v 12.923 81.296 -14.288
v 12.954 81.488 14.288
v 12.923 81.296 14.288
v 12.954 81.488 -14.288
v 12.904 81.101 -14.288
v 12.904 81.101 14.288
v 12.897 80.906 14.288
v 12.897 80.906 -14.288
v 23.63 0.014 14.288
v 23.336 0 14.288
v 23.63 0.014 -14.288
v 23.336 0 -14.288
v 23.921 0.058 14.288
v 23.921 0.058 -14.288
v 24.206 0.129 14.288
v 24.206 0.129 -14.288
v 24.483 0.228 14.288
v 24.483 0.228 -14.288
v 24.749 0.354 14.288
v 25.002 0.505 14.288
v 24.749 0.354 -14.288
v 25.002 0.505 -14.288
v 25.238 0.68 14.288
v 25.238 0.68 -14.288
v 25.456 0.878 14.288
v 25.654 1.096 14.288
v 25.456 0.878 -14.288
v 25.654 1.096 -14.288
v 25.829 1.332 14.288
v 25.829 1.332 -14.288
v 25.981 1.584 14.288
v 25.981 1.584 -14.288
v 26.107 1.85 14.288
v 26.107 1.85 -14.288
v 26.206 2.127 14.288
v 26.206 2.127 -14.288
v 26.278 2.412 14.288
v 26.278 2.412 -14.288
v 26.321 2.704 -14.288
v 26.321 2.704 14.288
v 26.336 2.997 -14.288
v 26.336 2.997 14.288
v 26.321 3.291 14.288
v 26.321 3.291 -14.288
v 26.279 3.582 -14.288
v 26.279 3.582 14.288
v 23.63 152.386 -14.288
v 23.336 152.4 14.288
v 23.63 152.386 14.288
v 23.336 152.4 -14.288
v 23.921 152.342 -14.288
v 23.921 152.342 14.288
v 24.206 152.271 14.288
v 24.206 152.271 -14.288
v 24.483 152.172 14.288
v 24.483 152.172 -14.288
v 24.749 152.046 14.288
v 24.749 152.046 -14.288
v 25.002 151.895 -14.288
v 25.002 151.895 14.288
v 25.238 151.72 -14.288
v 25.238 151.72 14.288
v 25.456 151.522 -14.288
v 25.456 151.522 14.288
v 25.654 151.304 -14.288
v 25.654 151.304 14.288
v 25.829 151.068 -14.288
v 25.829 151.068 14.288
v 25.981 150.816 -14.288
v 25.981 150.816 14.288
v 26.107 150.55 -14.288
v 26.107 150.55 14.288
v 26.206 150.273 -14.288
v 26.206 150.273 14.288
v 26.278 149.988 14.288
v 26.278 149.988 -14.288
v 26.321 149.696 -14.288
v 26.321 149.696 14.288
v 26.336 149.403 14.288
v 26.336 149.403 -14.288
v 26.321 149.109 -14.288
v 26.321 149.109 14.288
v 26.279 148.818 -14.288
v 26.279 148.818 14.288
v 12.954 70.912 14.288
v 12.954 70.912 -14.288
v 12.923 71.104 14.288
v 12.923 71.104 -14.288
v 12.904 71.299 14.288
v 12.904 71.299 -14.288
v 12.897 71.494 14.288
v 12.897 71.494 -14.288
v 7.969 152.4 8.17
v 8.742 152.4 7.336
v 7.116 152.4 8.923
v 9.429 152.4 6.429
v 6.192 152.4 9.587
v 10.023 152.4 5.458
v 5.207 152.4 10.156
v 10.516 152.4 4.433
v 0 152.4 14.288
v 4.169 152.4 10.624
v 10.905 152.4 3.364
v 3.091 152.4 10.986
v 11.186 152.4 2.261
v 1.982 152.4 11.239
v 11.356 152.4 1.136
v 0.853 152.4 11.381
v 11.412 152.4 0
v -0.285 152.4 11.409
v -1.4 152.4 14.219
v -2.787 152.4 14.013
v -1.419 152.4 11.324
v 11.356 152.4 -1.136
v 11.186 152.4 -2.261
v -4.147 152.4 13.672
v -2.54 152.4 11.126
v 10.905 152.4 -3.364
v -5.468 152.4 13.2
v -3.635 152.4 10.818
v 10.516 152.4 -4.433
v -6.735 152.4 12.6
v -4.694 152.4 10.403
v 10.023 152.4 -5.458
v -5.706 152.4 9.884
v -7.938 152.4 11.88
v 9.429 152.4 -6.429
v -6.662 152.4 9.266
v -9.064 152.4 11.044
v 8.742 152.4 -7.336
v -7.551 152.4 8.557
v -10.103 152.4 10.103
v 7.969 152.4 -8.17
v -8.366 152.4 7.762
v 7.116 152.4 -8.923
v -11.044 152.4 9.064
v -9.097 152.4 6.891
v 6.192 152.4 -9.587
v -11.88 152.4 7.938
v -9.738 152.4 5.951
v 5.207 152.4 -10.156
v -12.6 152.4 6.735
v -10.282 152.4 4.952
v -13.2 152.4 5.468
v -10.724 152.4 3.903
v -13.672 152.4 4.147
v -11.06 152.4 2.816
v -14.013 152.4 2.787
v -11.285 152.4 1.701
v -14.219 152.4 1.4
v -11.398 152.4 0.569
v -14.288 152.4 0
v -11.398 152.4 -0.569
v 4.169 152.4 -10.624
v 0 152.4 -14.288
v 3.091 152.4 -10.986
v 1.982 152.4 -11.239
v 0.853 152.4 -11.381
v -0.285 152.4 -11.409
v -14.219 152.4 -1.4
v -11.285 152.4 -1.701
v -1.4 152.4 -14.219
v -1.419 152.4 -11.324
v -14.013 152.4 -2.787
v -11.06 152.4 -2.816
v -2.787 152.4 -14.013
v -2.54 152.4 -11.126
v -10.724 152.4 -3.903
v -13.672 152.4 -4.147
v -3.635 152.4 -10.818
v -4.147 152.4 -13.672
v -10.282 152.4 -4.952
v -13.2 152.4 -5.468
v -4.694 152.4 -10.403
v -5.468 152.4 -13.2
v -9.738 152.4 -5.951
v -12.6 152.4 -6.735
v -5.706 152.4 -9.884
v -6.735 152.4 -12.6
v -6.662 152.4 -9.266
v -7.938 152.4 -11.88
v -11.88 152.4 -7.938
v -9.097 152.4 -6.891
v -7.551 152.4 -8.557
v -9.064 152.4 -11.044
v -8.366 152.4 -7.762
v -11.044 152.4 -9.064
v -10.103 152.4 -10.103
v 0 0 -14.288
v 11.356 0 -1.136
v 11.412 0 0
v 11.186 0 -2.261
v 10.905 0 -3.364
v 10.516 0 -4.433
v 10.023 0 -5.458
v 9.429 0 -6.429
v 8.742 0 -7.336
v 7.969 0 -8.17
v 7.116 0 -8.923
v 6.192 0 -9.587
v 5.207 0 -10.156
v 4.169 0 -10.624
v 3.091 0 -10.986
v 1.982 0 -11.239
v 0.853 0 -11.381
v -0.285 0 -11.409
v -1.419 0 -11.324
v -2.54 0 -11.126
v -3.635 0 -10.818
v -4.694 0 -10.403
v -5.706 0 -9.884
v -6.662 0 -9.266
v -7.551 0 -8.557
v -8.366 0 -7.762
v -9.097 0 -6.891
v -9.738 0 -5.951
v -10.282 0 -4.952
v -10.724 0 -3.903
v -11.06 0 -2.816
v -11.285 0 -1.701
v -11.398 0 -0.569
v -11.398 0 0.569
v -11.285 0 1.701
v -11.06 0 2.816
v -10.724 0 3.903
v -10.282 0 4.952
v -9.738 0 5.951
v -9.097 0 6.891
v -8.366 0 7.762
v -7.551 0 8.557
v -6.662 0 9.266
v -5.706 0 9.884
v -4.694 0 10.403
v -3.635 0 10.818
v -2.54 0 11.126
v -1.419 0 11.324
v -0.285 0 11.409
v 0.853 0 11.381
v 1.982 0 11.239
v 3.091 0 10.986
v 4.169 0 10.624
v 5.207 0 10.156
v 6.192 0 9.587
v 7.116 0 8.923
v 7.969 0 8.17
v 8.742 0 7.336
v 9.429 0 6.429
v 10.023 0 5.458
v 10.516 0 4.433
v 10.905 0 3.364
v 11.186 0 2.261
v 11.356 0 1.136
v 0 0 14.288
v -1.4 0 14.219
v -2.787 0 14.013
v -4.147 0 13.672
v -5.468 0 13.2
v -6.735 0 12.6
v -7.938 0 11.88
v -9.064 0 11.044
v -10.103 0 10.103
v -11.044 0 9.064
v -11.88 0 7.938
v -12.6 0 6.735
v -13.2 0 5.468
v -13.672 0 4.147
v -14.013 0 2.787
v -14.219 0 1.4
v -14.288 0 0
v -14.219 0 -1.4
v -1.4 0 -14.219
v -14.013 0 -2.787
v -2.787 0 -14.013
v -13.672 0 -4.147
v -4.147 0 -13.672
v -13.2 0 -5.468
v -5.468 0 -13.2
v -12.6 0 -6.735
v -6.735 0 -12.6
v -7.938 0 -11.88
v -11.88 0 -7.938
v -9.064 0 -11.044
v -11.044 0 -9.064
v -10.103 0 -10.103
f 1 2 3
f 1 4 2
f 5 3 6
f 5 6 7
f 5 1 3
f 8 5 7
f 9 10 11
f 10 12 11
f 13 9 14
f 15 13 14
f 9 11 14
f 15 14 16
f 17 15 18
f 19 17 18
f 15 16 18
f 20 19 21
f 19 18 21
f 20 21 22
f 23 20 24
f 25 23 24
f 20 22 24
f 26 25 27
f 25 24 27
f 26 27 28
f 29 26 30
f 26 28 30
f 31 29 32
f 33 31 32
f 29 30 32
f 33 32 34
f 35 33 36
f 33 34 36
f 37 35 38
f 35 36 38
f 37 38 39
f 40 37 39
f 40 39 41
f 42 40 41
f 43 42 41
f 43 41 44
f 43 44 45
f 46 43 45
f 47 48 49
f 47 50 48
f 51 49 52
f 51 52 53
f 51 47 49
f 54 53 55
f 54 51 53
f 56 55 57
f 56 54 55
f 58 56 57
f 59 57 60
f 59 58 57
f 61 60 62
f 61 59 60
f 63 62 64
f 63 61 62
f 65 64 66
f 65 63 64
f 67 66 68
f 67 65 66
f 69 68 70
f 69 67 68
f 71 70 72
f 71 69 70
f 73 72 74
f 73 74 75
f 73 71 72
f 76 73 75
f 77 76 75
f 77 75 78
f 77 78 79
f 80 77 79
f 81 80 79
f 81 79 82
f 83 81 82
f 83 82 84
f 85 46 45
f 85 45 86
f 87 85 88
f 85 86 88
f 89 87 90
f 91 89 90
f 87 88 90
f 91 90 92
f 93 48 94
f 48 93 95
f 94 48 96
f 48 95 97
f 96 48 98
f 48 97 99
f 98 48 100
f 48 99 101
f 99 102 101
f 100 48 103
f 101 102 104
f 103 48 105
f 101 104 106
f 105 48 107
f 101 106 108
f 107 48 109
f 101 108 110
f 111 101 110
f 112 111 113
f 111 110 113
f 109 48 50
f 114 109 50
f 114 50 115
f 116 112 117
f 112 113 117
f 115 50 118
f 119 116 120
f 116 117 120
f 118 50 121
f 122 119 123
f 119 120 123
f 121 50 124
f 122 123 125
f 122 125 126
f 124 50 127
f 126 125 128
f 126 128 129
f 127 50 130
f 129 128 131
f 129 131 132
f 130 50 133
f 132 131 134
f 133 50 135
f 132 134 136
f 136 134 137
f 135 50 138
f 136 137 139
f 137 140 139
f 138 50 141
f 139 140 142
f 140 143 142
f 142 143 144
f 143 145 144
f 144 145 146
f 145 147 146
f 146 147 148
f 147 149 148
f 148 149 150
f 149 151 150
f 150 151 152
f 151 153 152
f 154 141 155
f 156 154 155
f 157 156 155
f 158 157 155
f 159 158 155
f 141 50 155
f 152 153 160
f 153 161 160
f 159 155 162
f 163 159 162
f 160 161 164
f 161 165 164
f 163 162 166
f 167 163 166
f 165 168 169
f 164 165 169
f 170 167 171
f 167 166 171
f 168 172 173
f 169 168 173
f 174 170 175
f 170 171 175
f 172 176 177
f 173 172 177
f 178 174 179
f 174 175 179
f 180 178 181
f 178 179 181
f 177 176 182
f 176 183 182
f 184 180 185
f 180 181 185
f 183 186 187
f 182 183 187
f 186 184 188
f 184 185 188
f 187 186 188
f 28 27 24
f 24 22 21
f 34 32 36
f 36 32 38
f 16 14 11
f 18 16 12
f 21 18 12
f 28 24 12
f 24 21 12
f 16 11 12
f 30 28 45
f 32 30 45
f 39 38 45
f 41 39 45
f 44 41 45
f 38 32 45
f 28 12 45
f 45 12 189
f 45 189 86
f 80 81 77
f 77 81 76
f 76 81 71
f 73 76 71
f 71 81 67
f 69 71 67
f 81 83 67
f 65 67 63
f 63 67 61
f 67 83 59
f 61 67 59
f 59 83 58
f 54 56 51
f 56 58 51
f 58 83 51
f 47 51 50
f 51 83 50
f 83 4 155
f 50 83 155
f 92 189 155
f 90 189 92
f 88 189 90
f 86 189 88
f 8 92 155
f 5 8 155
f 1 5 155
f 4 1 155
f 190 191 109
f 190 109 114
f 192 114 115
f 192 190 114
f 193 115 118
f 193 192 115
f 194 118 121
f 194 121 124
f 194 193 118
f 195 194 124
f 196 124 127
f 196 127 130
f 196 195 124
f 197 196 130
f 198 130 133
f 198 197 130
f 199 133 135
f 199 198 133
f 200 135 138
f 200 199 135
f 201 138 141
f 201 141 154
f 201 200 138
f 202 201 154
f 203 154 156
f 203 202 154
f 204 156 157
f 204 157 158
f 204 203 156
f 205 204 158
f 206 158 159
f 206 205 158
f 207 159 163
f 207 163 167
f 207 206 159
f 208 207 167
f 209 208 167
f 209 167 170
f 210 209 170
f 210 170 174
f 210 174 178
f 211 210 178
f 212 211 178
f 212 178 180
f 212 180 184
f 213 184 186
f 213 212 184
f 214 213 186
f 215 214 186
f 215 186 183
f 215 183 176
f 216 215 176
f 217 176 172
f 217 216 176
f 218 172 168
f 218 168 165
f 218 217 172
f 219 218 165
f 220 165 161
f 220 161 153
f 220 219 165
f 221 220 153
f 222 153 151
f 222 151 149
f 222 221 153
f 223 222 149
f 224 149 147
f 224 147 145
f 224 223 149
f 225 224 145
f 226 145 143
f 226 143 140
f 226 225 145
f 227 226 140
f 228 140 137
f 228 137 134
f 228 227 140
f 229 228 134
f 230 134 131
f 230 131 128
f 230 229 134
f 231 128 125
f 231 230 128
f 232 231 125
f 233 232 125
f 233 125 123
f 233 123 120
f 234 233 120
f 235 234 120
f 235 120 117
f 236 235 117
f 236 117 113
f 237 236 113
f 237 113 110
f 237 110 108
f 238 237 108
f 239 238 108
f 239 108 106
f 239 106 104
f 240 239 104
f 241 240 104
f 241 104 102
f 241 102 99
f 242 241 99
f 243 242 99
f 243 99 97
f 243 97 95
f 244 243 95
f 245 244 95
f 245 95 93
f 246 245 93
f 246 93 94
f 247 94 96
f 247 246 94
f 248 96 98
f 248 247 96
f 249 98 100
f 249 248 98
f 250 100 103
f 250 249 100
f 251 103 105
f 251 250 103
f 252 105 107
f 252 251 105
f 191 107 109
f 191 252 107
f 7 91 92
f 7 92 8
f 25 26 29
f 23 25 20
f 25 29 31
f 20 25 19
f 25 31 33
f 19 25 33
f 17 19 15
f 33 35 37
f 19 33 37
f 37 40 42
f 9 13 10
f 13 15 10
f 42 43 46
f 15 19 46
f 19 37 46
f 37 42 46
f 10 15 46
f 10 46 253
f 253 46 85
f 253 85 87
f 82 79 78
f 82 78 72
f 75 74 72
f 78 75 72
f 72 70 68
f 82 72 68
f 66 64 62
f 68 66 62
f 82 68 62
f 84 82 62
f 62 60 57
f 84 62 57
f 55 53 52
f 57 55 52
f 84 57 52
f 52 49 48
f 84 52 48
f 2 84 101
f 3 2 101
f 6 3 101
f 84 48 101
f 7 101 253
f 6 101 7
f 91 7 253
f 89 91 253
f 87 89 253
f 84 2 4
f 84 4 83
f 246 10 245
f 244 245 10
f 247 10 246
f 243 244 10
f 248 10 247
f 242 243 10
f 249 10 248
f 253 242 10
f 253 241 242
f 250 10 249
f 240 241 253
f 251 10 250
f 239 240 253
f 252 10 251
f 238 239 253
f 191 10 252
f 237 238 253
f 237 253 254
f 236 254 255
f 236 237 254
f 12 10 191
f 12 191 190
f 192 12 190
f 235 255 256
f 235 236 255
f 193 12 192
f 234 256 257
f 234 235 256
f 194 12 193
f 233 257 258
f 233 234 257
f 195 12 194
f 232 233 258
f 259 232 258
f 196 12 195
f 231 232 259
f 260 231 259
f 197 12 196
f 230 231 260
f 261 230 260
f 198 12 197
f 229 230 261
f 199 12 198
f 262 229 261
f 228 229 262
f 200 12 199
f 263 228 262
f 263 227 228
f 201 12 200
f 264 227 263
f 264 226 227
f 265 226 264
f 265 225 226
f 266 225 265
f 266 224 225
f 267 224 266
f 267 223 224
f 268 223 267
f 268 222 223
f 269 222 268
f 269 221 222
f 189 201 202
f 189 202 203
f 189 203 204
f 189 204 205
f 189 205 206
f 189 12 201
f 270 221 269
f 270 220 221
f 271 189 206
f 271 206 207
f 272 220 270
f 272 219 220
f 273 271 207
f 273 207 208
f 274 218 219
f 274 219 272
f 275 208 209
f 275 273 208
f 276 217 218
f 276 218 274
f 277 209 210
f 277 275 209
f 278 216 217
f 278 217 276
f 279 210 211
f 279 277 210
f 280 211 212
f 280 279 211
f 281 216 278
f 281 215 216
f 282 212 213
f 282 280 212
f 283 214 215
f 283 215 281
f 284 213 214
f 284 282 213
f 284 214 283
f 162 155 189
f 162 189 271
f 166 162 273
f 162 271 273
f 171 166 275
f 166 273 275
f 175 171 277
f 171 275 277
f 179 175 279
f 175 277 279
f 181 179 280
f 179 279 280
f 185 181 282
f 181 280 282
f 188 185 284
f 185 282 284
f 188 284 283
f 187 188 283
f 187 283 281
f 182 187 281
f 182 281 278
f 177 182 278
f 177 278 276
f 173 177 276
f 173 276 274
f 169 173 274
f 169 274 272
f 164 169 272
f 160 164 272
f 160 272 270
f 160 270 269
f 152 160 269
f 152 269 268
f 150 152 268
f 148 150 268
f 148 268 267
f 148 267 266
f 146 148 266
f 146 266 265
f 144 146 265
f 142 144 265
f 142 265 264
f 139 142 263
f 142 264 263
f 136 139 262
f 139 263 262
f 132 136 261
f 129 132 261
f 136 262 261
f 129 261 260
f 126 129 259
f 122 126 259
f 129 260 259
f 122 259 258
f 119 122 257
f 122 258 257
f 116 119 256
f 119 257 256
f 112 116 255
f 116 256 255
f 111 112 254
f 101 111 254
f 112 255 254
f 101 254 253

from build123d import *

# Parameters (mm, degrees)
SKETCH1_R           = 14.2875
SKETCH1_R_2         = 11.4125
BOSS_EXTRUDE1_DEPTH = 152.4
SKETCH2_W           = 28.575
SKETCH2_H           = 152.4
BOSS_EXTRUDE2_DEPTH = 12.7
BOSS_EXTRUDE3_DEPTH = 152.4
CUT_EXTRUDE1_DEPTH  = 29.575
FILLET1_R           = 3


with BuildPart() as part:
    # Sketch1 → Boss-Extrude1 (new body)
    with BuildSketch(Plane(origin=(0, 0, 0), x_dir=(1, 0, 0), z_dir=(0, 1, 0))):
        Circle(SKETCH1_R)
        Circle(SKETCH1_R_2, mode=Mode.SUBTRACT)
    extrude(amount=BOSS_EXTRUDE1_DEPTH)



with BuildPart() as body_2:
    # Sketch2 → Boss-Extrude2 (new body)
    with BuildSketch(Plane(origin=(14.2875, 0, 0), x_dir=(0, 0, -1), z_dir=(1, 0, 0))):
        with Locations((0, 76.2)):
            Rectangle(SKETCH2_W, SKETCH2_H)
    extrude(amount=BOSS_EXTRUDE2_DEPTH)


with BuildPart() as part_1:
    add(part.part)

    add(body_2.part)  # Boss-Extrude3 merges body 2
    # Sketch3 → Boss-Extrude3 (add, through all)
    with BuildSketch(Plane(origin=(0, 152.4, 0), x_dir=(1, 0, 0), z_dir=(0, 1, 0))):
        with BuildLine():
            Line((14.2875, -14.2875), (0, -14.2875))
            ThreePointArc((0, -14.2875), (14.2875, 0), (0, 14.2875))
            Line((0, 14.2875), (14.2875, 14.2875))
            Line((14.2875, 14.2875), (26.9875, 14.2875))
            Line((26.9875, 14.2875), (26.9875, -14.2875))
            Line((26.9875, -14.2875), (14.2875, -14.2875))
        make_face()
    extrude(amount=-BOSS_EXTRUDE3_DEPTH)

    # Sketch5 → Cut-Extrude1 (cut, through all)
    with BuildSketch(Plane.XY.offset(14.2875)):
        Polygon((26.9875, 0), (12.897222949, 71.2), (12.897222949, 81.2), (26.9875, 152.4), align=None)
    extrude(amount=-CUT_EXTRUDE1_DEPTH, mode=Mode.SUBTRACT)

    # Fillet1
    fillet1_edges = [part_1.edges().sort_by_distance(p)[0] for p in [
        (26.9875, 0, 0),
        (26.9875, 152.4, 0),
        (12.897222949, 71.2, 0),
        (12.897222949, 81.2, 0),
    ]]
    fillet(fillet1_edges, radius=FILLET1_R)


solid = part_1.part
